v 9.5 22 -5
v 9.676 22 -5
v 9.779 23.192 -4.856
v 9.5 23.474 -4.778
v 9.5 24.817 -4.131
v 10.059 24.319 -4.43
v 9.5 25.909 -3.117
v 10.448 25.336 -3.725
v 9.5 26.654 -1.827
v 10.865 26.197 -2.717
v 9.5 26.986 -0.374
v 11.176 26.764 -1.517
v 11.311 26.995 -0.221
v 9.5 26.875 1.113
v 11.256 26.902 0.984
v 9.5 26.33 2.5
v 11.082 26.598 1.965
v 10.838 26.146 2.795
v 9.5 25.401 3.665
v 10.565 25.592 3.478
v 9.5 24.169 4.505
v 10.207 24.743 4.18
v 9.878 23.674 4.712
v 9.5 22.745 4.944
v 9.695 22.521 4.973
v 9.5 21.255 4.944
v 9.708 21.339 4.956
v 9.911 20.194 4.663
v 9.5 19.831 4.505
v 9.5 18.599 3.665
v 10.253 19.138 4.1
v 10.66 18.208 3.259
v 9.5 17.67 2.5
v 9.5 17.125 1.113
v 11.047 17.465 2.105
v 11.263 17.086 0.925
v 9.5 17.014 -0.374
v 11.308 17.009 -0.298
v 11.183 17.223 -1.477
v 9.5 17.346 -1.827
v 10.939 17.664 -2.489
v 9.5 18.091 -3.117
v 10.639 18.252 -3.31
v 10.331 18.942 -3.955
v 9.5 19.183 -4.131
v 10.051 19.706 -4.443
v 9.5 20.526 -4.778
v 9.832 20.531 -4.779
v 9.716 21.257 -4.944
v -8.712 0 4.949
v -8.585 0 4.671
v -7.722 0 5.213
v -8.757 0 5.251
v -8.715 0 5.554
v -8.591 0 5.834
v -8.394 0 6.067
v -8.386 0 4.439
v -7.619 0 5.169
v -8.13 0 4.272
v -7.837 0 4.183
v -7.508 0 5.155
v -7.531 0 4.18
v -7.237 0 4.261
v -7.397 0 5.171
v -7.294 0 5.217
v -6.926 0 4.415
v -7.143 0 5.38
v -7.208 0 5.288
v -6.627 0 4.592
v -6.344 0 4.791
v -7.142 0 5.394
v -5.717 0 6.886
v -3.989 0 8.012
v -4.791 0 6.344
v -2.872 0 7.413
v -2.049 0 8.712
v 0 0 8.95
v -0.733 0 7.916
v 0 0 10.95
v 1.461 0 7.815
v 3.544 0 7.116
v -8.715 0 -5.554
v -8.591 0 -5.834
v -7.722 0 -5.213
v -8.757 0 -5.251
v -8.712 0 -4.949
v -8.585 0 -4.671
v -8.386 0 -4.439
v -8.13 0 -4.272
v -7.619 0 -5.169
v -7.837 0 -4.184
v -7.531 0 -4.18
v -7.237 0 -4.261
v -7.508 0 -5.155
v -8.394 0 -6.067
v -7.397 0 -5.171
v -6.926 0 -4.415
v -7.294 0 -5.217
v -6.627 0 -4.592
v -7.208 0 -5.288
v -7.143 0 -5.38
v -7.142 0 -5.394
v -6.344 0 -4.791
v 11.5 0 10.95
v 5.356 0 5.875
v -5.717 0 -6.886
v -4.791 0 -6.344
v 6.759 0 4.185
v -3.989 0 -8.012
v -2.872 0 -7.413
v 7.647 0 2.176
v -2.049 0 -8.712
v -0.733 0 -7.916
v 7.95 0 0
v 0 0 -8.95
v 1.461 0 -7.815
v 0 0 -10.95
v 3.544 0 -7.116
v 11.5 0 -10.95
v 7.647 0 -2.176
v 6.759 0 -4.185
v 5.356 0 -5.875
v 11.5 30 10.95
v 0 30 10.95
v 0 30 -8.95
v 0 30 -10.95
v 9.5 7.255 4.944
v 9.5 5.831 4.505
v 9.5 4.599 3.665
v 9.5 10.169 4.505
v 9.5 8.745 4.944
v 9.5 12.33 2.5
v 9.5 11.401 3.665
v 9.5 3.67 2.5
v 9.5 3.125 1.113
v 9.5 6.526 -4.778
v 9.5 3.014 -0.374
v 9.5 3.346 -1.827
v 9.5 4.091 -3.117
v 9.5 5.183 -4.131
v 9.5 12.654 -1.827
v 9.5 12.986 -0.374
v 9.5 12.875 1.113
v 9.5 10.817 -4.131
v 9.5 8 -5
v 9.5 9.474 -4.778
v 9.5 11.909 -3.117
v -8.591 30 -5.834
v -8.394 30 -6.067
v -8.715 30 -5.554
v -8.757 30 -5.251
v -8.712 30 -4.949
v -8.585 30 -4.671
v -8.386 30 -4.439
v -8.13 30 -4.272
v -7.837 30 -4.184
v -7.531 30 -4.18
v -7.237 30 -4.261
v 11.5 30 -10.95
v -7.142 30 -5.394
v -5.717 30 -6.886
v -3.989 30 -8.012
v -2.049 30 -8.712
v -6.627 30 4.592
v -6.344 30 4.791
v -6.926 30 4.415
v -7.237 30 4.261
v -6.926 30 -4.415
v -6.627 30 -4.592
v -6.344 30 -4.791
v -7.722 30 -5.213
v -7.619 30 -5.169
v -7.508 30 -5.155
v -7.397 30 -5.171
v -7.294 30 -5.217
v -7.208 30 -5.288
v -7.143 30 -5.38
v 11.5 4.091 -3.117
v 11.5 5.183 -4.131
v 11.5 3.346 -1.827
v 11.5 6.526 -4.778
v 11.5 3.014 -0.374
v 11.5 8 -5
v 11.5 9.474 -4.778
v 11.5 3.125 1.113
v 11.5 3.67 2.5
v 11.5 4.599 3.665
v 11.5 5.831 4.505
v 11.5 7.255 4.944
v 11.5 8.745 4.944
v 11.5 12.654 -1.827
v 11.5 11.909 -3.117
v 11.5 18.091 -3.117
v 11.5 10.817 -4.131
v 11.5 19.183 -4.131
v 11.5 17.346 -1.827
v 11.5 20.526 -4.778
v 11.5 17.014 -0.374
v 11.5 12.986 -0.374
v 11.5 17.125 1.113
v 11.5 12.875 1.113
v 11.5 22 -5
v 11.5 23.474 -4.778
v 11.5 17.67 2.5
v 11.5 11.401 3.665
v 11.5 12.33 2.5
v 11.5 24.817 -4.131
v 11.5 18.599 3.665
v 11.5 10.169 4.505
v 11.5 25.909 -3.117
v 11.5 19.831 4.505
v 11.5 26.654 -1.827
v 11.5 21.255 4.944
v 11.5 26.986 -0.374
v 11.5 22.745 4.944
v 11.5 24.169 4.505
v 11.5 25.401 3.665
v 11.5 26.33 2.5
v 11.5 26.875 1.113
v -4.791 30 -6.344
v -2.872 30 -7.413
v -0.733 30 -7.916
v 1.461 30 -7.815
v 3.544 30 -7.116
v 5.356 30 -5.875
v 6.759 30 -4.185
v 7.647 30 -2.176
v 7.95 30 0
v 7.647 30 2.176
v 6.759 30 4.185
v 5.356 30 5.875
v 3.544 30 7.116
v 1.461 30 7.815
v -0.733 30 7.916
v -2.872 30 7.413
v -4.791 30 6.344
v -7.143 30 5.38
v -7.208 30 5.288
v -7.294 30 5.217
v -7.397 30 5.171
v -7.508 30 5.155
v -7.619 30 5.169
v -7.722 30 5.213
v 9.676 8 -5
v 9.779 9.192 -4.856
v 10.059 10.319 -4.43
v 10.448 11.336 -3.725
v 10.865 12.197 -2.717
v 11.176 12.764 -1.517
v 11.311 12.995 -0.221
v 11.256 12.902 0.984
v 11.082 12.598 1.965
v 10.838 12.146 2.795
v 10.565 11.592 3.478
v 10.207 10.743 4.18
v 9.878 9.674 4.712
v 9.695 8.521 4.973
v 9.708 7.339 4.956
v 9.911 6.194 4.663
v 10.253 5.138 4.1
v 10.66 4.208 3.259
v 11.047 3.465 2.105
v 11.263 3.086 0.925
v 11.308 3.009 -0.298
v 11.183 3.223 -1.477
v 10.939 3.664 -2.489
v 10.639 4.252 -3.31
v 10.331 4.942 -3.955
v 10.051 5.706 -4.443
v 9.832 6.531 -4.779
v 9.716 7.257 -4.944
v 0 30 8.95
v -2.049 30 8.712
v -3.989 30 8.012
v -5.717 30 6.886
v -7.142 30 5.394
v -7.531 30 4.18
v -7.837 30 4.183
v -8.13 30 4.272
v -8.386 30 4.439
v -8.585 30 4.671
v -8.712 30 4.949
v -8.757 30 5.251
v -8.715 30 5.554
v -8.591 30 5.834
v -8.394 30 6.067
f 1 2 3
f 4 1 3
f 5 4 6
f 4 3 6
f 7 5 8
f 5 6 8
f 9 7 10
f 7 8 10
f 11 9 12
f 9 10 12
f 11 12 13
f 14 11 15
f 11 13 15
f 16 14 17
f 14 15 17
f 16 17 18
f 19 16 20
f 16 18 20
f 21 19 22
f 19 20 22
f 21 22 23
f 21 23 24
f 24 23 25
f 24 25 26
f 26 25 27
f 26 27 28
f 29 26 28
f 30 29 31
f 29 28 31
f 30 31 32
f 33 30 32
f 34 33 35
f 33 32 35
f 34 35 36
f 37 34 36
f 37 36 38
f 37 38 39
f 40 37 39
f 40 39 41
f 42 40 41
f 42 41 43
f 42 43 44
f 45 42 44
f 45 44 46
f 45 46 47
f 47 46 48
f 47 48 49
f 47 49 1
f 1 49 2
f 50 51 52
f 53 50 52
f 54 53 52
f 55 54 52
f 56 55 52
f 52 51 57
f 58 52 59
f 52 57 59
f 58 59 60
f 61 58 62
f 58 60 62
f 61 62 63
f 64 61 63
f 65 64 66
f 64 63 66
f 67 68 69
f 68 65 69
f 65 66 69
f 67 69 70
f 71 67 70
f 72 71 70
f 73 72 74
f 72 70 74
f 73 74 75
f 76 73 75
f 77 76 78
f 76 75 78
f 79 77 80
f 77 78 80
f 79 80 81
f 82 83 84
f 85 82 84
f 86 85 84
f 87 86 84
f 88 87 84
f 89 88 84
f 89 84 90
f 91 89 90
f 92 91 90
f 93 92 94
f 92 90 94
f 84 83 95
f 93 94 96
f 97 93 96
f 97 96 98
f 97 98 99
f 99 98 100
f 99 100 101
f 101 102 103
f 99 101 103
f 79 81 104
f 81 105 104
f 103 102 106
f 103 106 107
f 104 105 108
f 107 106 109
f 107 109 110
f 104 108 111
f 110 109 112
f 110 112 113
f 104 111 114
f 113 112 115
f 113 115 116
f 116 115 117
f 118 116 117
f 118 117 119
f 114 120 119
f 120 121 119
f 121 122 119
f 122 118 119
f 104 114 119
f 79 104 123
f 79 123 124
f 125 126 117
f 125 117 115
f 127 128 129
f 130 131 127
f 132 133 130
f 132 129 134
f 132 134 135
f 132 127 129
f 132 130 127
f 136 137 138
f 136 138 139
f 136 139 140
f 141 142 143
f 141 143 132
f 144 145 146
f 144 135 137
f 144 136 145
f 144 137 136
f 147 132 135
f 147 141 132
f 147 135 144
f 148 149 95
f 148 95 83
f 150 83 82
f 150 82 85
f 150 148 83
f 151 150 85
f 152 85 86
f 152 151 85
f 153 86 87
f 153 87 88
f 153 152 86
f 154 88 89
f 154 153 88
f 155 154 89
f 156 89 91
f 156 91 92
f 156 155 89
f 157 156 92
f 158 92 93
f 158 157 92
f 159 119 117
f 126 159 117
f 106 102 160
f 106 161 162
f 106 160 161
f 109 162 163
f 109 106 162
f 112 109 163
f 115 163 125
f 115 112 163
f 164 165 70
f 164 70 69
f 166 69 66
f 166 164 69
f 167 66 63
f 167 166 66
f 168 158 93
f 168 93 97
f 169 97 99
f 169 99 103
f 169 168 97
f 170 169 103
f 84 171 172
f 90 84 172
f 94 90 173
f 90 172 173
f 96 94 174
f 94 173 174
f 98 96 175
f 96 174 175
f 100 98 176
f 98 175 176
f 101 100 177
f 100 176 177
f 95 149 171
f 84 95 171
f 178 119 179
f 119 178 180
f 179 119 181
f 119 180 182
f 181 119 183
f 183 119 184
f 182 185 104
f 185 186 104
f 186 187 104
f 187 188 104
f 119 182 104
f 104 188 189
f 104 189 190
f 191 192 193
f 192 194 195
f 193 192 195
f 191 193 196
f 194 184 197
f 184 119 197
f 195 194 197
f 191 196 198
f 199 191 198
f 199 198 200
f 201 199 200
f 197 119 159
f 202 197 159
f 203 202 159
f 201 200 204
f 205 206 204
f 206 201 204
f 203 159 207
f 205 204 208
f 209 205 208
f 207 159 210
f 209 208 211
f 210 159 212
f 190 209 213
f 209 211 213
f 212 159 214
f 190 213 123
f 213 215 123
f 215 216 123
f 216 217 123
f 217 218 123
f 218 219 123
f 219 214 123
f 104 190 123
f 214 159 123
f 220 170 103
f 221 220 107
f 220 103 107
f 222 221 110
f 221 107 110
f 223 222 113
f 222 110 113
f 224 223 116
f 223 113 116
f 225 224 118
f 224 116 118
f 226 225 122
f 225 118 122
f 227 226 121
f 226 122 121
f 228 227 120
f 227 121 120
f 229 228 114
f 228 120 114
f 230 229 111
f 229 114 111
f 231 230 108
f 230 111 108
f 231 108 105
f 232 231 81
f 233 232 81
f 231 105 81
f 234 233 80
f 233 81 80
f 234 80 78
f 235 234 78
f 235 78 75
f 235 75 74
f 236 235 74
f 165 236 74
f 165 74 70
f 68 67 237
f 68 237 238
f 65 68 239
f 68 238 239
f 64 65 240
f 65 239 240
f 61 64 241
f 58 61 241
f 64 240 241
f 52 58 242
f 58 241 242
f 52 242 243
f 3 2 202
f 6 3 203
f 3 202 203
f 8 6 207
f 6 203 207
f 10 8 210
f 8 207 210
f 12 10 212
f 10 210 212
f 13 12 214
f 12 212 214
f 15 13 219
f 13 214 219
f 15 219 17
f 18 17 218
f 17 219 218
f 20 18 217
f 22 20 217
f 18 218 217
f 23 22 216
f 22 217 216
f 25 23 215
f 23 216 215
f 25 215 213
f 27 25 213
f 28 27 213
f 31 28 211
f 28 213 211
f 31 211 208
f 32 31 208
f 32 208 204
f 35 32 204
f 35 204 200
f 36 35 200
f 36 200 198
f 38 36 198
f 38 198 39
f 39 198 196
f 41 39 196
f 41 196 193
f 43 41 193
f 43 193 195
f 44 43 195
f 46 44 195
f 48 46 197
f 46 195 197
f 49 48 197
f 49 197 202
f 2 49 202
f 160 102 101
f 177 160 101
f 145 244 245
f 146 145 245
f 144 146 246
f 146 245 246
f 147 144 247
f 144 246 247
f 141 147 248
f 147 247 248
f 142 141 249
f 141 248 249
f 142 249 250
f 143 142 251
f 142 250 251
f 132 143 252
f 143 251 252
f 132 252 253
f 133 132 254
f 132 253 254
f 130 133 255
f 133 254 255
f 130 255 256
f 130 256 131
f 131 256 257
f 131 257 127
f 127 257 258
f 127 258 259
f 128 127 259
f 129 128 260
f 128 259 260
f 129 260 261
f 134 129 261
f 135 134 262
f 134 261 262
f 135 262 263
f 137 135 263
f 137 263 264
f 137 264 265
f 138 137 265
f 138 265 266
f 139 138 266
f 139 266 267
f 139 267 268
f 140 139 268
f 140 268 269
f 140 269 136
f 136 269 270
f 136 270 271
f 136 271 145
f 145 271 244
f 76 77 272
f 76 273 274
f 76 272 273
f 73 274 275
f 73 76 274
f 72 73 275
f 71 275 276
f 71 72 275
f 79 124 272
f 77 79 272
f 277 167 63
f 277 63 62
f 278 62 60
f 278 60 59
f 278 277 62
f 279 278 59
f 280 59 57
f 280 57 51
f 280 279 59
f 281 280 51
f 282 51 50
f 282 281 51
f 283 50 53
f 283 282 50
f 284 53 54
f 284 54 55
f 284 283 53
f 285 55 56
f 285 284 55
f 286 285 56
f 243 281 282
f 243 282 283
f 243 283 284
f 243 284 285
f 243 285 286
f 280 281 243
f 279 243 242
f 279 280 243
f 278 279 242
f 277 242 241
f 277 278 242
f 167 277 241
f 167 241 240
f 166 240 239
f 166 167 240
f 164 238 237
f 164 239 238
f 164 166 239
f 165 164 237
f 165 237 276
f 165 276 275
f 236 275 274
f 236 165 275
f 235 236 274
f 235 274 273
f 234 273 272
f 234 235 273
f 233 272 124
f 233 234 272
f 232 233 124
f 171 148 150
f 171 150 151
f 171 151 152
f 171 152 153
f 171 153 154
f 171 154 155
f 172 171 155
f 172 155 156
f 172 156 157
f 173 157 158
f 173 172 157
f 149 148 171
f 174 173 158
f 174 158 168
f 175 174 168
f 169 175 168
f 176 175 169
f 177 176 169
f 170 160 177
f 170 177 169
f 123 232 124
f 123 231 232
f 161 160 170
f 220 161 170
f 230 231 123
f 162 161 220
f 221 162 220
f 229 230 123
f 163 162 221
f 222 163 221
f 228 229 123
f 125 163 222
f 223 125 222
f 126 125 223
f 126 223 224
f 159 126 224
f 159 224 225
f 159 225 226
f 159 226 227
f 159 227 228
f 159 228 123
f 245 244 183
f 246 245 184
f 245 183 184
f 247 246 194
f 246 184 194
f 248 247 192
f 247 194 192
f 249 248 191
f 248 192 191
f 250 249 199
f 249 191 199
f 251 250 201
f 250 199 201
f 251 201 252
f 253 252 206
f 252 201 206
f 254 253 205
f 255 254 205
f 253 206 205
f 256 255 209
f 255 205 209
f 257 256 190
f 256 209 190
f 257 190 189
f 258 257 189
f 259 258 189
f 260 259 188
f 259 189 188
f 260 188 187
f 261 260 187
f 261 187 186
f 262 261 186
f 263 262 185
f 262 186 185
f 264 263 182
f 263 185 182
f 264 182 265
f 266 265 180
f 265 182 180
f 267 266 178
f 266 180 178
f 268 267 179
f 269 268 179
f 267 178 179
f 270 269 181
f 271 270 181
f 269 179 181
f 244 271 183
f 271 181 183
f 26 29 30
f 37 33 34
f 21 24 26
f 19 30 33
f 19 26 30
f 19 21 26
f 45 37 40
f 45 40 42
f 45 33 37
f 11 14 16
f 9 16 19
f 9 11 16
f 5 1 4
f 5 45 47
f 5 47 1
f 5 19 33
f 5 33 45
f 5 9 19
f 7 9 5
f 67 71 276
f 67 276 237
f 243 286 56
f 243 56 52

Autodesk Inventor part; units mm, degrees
ref_plane "YZ Plane" through (0, 0, 0) normal (1, 0, 0) x (0, 1, 0)
ref_plane "XZ Plane" through (0, 0, 0) normal (0, 1, 0) x (-1, 0, 0)
ref_plane "XY Plane" through (0, 0, 0) normal (0, 0, 1) x (1, 0, 0)
sketch "Эскиз1" plane through (0, 0, 0) normal (0, 1, 0) x (-1, 0, 0)
  circle A0 centre (0, 0) radius 7.95
  circle A1 centre (0, 0) radius 8.95
  line L0 (0, 0) -> (7.1419, 5.394)
  line L1 (0, 0) -> (7.1419, -5.394)
  point P0 (6.3439, -4.7913)
  point P1 (6.3439, 4.7913)
  dimension "d0" = 15.9
  dimension "d1" = 17.9
extrude "Выдавливание1" add sketch "Эскиз1" along normal blind 30 contours A0 L1 A1 L0 picked at (-8.5243, 0.7366)
sketch "Эскиз2" plane through (0, 30, 0) normal (0, 1, 0) x (1, 0, 0)
  arc A0 (-6.3439, -4.7913) -> (-7.2366, -4.2614) centre (-9.0453, -8.3253) ccw
  arc A1 (-7.2366, -4.2614) -> (-8.3936, -6.0672) centre (-7.671, -5.2567) ccw
  line L0 (-8.3936, -6.0672) -> (-7.7223, -5.2127)
  arc A2 (-7.1433, -5.3795) -> (-7.7223, -5.2127) centre (-7.5117, -5.5699) ccw
  line L1 (-6.3439, -4.7913) -> (-7.1419, -5.394)
  line L2 (-7.1419, -5.394) -> (-6.3439, -4.7913)
  line L3 (-7.1419, -5.394) -> (-7.1433, -5.3795)
  line L4 (-0.0151, 0) -> (-3.489, 0)
  arc A3 (-7.2366, 4.2614) -> (-6.3439, 4.7913) centre (-9.0453, 8.3253) ccw
  arc A4 (-7.7223, 5.2127) -> (-7.1433, 5.3795) centre (-7.5117, 5.5699) ccw
  line L5 (-6.3439, 4.7913) -> (-7.1419, 5.394)
  line L6 (-7.1419, 5.394) -> (-6.3439, 4.7913)
  line L7 (-7.1419, 5.394) -> (-7.1433, 5.3795)
  arc A5 (-8.3936, 6.0672) -> (-7.2366, 4.2614) centre (-7.671, 5.2567) ccw
  line L8 (-8.3936, 6.0672) -> (-7.7223, 5.2127)
  point P0 (-6.3439, 4.7913)
  point P1 (-7.1419, -5.394)
  point P2 (-5.3694, -4.0591)
  point P3 (-7.1419, 5.394)
  point P4 (-5.3694, 4.0591)
  point P5 (-7.1419, 5.394)
  dimension "d25" = 1.0859
sketch "Эскиз3" plane through (0, 30, 0) normal (0, 1, 0) x (1, 0, 0)
  arc A0 (-7.1419, -5.394) -> (-7.1419, 5.394) centre (0, 0) ccw projected
  line L0 (11.5, -6.95) -> (11.5, 6.95)
  arc A1 (-6.3439, -4.7913) -> (-6.3439, 4.7913) centre (0, 0) ccw projected
  arc A2 (0, -7.95) -> (0, 7.95) centre (2.8636, 0) ccw
  line L1 (0, -8.95) -> (0, -7.95)
  line L2 (0, 7.95) -> (0, 8.95)
  line L3 (11.5, 6.95) -> (11.5, 10.95)
  line L4 (11.5, -6.95) -> (11.5, -10.95)
  line L5 (0, 4.45) -> (0, 8.95)
  line L6 (11.5, -10.95) -> (0, -10.95)
  line L7 (0, -10.95) -> (0, -8.95)
  line L8 (11.5, 10.95) -> (0, 10.95)
  line L9 (0, 10.95) -> (0, 8.95)
  point P0 (0, 7.95)
  dimension "d13" = 4
  dimension "d14" = 4
  dimension "d22" = 21.9
  dimension "d23" = 3
extrude "Выдавливание3" add sketch "Эскиз3" against normal blind 30 contours L1 A2 A0 | A0 A2 L9 L8 L3 L0 L4 L6 L7 | A2 L2 A0
ref_plane "РабПлоскость1" through (11.5, 20, 4.95) normal (1, 0, 0) x (0, 0, -1)
sketch "Эскиз4" plane through (11.5, 20, 4.95) normal (1, 0, 0) x (0, 0, -1)
  line L0 (4.95, -20) -> (4.95, 10)
  line L1 (1, 10) -> (8.9, 10) projected
  circle A0 centre (4.95, -12) radius 5
  line L2 (14.4, -20) -> (-4.5, -20) projected
  circle A1 centre (4.95, 2) radius 5
  line L3 (-4.5, 10) -> (14.4, 10) projected
  point P0 (7.3306, 10)
  point P1 (2.5694, 10)
  point P2 (4.95, 10)
  dimension "d15" = 10
  dimension "d16" = 8
  dimension "d17" = 10
  dimension "d18" = 8
extrude "Выдавливание4" cut sketch "Эскиз4" against normal blind 2
extrude "Выдавливание5" add sketch "Эскиз2" against normal blind 30
sketch "Эскиз5" plane through (0, 30, 0) normal (0, 1, 0) x (1, 0, 0)
  arc A0 (0, 8.95) -> (-7.1419, 5.394) centre (0, 0) ccw projected
  line L0 (-7.1419, 5.394) -> (-7.1433, 5.3795) projected
  arc A1 (-7.7223, 5.2127) -> (-7.1433, 5.3795) centre (-7.5117, 5.5699) ccw projected
  line L1 (-7.7223, 5.2127) -> (-8.3936, 6.0672) projected
  arc A2 (-8.3936, 6.0672) -> (-7.2366, 4.2614) centre (-7.671, 5.2567) ccw projected
  arc A3 (-7.2366, 4.2614) -> (-6.3439, 4.7913) centre (-9.0453, 8.3253) ccw projected
  arc A4 (-6.3439, -4.7913) -> (-6.3439, 4.7913) centre (0, 0) ccw projected
  arc A5 (-6.3439, -4.7913) -> (-7.2366, -4.2614) centre (-9.0453, -8.3253) ccw projected
  arc A6 (-7.2366, -4.2614) -> (-8.3936, -6.0672) centre (-7.671, -5.2567) ccw projected
  line L2 (-8.3936, -6.0672) -> (-7.7223, -5.2127) projected
  arc A7 (-7.1433, -5.3795) -> (-7.7223, -5.2127) centre (-7.5117, -5.5699) ccw projected
  line L3 (-7.1433, -5.3795) -> (-7.1419, -5.394) projected
  arc A8 (-7.1419, -5.394) -> (0, -8.95) centre (0, 0) ccw projected
  line L4 (0, -8.95) -> (0, -10.95) projected
  line L5 (0, -10.95) -> (11.5, -10.95) projected
  line L6 (11.5, -10.95) -> (11.5, 10.95) projected
  line L7 (11.5, 10.95) -> (0, 10.95) projected
  line L8 (0, 10.95) -> (0, 8.95) projected
  arc A9 (2.9509, -8.4495) -> (2.9509, 8.4495) centre (2.8636, 0) ccw projected
  arc A10 (2.9509, -8.4495) -> (2.9509, 8.4495) centre (0, 0) ccw projected
  line L9 (0, 7.95) -> (0, 8.95)
  line L10 (0, -7.95) -> (0, -8.95)
extrude "Выдавливание6" add sketch "Эскиз5" against normal blind 30 contours A10 A9
sketch "Эскиз6" plane through (11.5, 30, 10.95) normal (1, 0, 0) x (0, 0, -1)
  circle A0 centre (10.95, -22) radius 5 projected
  circle A1 centre (10.95, -8) radius 5 projected
  point P0 (10.95, -30)
extrude "Выдавливание7" cut sketch "Эскиз6" against normal blind 2
properties part number "крепление маркера 16мм"
